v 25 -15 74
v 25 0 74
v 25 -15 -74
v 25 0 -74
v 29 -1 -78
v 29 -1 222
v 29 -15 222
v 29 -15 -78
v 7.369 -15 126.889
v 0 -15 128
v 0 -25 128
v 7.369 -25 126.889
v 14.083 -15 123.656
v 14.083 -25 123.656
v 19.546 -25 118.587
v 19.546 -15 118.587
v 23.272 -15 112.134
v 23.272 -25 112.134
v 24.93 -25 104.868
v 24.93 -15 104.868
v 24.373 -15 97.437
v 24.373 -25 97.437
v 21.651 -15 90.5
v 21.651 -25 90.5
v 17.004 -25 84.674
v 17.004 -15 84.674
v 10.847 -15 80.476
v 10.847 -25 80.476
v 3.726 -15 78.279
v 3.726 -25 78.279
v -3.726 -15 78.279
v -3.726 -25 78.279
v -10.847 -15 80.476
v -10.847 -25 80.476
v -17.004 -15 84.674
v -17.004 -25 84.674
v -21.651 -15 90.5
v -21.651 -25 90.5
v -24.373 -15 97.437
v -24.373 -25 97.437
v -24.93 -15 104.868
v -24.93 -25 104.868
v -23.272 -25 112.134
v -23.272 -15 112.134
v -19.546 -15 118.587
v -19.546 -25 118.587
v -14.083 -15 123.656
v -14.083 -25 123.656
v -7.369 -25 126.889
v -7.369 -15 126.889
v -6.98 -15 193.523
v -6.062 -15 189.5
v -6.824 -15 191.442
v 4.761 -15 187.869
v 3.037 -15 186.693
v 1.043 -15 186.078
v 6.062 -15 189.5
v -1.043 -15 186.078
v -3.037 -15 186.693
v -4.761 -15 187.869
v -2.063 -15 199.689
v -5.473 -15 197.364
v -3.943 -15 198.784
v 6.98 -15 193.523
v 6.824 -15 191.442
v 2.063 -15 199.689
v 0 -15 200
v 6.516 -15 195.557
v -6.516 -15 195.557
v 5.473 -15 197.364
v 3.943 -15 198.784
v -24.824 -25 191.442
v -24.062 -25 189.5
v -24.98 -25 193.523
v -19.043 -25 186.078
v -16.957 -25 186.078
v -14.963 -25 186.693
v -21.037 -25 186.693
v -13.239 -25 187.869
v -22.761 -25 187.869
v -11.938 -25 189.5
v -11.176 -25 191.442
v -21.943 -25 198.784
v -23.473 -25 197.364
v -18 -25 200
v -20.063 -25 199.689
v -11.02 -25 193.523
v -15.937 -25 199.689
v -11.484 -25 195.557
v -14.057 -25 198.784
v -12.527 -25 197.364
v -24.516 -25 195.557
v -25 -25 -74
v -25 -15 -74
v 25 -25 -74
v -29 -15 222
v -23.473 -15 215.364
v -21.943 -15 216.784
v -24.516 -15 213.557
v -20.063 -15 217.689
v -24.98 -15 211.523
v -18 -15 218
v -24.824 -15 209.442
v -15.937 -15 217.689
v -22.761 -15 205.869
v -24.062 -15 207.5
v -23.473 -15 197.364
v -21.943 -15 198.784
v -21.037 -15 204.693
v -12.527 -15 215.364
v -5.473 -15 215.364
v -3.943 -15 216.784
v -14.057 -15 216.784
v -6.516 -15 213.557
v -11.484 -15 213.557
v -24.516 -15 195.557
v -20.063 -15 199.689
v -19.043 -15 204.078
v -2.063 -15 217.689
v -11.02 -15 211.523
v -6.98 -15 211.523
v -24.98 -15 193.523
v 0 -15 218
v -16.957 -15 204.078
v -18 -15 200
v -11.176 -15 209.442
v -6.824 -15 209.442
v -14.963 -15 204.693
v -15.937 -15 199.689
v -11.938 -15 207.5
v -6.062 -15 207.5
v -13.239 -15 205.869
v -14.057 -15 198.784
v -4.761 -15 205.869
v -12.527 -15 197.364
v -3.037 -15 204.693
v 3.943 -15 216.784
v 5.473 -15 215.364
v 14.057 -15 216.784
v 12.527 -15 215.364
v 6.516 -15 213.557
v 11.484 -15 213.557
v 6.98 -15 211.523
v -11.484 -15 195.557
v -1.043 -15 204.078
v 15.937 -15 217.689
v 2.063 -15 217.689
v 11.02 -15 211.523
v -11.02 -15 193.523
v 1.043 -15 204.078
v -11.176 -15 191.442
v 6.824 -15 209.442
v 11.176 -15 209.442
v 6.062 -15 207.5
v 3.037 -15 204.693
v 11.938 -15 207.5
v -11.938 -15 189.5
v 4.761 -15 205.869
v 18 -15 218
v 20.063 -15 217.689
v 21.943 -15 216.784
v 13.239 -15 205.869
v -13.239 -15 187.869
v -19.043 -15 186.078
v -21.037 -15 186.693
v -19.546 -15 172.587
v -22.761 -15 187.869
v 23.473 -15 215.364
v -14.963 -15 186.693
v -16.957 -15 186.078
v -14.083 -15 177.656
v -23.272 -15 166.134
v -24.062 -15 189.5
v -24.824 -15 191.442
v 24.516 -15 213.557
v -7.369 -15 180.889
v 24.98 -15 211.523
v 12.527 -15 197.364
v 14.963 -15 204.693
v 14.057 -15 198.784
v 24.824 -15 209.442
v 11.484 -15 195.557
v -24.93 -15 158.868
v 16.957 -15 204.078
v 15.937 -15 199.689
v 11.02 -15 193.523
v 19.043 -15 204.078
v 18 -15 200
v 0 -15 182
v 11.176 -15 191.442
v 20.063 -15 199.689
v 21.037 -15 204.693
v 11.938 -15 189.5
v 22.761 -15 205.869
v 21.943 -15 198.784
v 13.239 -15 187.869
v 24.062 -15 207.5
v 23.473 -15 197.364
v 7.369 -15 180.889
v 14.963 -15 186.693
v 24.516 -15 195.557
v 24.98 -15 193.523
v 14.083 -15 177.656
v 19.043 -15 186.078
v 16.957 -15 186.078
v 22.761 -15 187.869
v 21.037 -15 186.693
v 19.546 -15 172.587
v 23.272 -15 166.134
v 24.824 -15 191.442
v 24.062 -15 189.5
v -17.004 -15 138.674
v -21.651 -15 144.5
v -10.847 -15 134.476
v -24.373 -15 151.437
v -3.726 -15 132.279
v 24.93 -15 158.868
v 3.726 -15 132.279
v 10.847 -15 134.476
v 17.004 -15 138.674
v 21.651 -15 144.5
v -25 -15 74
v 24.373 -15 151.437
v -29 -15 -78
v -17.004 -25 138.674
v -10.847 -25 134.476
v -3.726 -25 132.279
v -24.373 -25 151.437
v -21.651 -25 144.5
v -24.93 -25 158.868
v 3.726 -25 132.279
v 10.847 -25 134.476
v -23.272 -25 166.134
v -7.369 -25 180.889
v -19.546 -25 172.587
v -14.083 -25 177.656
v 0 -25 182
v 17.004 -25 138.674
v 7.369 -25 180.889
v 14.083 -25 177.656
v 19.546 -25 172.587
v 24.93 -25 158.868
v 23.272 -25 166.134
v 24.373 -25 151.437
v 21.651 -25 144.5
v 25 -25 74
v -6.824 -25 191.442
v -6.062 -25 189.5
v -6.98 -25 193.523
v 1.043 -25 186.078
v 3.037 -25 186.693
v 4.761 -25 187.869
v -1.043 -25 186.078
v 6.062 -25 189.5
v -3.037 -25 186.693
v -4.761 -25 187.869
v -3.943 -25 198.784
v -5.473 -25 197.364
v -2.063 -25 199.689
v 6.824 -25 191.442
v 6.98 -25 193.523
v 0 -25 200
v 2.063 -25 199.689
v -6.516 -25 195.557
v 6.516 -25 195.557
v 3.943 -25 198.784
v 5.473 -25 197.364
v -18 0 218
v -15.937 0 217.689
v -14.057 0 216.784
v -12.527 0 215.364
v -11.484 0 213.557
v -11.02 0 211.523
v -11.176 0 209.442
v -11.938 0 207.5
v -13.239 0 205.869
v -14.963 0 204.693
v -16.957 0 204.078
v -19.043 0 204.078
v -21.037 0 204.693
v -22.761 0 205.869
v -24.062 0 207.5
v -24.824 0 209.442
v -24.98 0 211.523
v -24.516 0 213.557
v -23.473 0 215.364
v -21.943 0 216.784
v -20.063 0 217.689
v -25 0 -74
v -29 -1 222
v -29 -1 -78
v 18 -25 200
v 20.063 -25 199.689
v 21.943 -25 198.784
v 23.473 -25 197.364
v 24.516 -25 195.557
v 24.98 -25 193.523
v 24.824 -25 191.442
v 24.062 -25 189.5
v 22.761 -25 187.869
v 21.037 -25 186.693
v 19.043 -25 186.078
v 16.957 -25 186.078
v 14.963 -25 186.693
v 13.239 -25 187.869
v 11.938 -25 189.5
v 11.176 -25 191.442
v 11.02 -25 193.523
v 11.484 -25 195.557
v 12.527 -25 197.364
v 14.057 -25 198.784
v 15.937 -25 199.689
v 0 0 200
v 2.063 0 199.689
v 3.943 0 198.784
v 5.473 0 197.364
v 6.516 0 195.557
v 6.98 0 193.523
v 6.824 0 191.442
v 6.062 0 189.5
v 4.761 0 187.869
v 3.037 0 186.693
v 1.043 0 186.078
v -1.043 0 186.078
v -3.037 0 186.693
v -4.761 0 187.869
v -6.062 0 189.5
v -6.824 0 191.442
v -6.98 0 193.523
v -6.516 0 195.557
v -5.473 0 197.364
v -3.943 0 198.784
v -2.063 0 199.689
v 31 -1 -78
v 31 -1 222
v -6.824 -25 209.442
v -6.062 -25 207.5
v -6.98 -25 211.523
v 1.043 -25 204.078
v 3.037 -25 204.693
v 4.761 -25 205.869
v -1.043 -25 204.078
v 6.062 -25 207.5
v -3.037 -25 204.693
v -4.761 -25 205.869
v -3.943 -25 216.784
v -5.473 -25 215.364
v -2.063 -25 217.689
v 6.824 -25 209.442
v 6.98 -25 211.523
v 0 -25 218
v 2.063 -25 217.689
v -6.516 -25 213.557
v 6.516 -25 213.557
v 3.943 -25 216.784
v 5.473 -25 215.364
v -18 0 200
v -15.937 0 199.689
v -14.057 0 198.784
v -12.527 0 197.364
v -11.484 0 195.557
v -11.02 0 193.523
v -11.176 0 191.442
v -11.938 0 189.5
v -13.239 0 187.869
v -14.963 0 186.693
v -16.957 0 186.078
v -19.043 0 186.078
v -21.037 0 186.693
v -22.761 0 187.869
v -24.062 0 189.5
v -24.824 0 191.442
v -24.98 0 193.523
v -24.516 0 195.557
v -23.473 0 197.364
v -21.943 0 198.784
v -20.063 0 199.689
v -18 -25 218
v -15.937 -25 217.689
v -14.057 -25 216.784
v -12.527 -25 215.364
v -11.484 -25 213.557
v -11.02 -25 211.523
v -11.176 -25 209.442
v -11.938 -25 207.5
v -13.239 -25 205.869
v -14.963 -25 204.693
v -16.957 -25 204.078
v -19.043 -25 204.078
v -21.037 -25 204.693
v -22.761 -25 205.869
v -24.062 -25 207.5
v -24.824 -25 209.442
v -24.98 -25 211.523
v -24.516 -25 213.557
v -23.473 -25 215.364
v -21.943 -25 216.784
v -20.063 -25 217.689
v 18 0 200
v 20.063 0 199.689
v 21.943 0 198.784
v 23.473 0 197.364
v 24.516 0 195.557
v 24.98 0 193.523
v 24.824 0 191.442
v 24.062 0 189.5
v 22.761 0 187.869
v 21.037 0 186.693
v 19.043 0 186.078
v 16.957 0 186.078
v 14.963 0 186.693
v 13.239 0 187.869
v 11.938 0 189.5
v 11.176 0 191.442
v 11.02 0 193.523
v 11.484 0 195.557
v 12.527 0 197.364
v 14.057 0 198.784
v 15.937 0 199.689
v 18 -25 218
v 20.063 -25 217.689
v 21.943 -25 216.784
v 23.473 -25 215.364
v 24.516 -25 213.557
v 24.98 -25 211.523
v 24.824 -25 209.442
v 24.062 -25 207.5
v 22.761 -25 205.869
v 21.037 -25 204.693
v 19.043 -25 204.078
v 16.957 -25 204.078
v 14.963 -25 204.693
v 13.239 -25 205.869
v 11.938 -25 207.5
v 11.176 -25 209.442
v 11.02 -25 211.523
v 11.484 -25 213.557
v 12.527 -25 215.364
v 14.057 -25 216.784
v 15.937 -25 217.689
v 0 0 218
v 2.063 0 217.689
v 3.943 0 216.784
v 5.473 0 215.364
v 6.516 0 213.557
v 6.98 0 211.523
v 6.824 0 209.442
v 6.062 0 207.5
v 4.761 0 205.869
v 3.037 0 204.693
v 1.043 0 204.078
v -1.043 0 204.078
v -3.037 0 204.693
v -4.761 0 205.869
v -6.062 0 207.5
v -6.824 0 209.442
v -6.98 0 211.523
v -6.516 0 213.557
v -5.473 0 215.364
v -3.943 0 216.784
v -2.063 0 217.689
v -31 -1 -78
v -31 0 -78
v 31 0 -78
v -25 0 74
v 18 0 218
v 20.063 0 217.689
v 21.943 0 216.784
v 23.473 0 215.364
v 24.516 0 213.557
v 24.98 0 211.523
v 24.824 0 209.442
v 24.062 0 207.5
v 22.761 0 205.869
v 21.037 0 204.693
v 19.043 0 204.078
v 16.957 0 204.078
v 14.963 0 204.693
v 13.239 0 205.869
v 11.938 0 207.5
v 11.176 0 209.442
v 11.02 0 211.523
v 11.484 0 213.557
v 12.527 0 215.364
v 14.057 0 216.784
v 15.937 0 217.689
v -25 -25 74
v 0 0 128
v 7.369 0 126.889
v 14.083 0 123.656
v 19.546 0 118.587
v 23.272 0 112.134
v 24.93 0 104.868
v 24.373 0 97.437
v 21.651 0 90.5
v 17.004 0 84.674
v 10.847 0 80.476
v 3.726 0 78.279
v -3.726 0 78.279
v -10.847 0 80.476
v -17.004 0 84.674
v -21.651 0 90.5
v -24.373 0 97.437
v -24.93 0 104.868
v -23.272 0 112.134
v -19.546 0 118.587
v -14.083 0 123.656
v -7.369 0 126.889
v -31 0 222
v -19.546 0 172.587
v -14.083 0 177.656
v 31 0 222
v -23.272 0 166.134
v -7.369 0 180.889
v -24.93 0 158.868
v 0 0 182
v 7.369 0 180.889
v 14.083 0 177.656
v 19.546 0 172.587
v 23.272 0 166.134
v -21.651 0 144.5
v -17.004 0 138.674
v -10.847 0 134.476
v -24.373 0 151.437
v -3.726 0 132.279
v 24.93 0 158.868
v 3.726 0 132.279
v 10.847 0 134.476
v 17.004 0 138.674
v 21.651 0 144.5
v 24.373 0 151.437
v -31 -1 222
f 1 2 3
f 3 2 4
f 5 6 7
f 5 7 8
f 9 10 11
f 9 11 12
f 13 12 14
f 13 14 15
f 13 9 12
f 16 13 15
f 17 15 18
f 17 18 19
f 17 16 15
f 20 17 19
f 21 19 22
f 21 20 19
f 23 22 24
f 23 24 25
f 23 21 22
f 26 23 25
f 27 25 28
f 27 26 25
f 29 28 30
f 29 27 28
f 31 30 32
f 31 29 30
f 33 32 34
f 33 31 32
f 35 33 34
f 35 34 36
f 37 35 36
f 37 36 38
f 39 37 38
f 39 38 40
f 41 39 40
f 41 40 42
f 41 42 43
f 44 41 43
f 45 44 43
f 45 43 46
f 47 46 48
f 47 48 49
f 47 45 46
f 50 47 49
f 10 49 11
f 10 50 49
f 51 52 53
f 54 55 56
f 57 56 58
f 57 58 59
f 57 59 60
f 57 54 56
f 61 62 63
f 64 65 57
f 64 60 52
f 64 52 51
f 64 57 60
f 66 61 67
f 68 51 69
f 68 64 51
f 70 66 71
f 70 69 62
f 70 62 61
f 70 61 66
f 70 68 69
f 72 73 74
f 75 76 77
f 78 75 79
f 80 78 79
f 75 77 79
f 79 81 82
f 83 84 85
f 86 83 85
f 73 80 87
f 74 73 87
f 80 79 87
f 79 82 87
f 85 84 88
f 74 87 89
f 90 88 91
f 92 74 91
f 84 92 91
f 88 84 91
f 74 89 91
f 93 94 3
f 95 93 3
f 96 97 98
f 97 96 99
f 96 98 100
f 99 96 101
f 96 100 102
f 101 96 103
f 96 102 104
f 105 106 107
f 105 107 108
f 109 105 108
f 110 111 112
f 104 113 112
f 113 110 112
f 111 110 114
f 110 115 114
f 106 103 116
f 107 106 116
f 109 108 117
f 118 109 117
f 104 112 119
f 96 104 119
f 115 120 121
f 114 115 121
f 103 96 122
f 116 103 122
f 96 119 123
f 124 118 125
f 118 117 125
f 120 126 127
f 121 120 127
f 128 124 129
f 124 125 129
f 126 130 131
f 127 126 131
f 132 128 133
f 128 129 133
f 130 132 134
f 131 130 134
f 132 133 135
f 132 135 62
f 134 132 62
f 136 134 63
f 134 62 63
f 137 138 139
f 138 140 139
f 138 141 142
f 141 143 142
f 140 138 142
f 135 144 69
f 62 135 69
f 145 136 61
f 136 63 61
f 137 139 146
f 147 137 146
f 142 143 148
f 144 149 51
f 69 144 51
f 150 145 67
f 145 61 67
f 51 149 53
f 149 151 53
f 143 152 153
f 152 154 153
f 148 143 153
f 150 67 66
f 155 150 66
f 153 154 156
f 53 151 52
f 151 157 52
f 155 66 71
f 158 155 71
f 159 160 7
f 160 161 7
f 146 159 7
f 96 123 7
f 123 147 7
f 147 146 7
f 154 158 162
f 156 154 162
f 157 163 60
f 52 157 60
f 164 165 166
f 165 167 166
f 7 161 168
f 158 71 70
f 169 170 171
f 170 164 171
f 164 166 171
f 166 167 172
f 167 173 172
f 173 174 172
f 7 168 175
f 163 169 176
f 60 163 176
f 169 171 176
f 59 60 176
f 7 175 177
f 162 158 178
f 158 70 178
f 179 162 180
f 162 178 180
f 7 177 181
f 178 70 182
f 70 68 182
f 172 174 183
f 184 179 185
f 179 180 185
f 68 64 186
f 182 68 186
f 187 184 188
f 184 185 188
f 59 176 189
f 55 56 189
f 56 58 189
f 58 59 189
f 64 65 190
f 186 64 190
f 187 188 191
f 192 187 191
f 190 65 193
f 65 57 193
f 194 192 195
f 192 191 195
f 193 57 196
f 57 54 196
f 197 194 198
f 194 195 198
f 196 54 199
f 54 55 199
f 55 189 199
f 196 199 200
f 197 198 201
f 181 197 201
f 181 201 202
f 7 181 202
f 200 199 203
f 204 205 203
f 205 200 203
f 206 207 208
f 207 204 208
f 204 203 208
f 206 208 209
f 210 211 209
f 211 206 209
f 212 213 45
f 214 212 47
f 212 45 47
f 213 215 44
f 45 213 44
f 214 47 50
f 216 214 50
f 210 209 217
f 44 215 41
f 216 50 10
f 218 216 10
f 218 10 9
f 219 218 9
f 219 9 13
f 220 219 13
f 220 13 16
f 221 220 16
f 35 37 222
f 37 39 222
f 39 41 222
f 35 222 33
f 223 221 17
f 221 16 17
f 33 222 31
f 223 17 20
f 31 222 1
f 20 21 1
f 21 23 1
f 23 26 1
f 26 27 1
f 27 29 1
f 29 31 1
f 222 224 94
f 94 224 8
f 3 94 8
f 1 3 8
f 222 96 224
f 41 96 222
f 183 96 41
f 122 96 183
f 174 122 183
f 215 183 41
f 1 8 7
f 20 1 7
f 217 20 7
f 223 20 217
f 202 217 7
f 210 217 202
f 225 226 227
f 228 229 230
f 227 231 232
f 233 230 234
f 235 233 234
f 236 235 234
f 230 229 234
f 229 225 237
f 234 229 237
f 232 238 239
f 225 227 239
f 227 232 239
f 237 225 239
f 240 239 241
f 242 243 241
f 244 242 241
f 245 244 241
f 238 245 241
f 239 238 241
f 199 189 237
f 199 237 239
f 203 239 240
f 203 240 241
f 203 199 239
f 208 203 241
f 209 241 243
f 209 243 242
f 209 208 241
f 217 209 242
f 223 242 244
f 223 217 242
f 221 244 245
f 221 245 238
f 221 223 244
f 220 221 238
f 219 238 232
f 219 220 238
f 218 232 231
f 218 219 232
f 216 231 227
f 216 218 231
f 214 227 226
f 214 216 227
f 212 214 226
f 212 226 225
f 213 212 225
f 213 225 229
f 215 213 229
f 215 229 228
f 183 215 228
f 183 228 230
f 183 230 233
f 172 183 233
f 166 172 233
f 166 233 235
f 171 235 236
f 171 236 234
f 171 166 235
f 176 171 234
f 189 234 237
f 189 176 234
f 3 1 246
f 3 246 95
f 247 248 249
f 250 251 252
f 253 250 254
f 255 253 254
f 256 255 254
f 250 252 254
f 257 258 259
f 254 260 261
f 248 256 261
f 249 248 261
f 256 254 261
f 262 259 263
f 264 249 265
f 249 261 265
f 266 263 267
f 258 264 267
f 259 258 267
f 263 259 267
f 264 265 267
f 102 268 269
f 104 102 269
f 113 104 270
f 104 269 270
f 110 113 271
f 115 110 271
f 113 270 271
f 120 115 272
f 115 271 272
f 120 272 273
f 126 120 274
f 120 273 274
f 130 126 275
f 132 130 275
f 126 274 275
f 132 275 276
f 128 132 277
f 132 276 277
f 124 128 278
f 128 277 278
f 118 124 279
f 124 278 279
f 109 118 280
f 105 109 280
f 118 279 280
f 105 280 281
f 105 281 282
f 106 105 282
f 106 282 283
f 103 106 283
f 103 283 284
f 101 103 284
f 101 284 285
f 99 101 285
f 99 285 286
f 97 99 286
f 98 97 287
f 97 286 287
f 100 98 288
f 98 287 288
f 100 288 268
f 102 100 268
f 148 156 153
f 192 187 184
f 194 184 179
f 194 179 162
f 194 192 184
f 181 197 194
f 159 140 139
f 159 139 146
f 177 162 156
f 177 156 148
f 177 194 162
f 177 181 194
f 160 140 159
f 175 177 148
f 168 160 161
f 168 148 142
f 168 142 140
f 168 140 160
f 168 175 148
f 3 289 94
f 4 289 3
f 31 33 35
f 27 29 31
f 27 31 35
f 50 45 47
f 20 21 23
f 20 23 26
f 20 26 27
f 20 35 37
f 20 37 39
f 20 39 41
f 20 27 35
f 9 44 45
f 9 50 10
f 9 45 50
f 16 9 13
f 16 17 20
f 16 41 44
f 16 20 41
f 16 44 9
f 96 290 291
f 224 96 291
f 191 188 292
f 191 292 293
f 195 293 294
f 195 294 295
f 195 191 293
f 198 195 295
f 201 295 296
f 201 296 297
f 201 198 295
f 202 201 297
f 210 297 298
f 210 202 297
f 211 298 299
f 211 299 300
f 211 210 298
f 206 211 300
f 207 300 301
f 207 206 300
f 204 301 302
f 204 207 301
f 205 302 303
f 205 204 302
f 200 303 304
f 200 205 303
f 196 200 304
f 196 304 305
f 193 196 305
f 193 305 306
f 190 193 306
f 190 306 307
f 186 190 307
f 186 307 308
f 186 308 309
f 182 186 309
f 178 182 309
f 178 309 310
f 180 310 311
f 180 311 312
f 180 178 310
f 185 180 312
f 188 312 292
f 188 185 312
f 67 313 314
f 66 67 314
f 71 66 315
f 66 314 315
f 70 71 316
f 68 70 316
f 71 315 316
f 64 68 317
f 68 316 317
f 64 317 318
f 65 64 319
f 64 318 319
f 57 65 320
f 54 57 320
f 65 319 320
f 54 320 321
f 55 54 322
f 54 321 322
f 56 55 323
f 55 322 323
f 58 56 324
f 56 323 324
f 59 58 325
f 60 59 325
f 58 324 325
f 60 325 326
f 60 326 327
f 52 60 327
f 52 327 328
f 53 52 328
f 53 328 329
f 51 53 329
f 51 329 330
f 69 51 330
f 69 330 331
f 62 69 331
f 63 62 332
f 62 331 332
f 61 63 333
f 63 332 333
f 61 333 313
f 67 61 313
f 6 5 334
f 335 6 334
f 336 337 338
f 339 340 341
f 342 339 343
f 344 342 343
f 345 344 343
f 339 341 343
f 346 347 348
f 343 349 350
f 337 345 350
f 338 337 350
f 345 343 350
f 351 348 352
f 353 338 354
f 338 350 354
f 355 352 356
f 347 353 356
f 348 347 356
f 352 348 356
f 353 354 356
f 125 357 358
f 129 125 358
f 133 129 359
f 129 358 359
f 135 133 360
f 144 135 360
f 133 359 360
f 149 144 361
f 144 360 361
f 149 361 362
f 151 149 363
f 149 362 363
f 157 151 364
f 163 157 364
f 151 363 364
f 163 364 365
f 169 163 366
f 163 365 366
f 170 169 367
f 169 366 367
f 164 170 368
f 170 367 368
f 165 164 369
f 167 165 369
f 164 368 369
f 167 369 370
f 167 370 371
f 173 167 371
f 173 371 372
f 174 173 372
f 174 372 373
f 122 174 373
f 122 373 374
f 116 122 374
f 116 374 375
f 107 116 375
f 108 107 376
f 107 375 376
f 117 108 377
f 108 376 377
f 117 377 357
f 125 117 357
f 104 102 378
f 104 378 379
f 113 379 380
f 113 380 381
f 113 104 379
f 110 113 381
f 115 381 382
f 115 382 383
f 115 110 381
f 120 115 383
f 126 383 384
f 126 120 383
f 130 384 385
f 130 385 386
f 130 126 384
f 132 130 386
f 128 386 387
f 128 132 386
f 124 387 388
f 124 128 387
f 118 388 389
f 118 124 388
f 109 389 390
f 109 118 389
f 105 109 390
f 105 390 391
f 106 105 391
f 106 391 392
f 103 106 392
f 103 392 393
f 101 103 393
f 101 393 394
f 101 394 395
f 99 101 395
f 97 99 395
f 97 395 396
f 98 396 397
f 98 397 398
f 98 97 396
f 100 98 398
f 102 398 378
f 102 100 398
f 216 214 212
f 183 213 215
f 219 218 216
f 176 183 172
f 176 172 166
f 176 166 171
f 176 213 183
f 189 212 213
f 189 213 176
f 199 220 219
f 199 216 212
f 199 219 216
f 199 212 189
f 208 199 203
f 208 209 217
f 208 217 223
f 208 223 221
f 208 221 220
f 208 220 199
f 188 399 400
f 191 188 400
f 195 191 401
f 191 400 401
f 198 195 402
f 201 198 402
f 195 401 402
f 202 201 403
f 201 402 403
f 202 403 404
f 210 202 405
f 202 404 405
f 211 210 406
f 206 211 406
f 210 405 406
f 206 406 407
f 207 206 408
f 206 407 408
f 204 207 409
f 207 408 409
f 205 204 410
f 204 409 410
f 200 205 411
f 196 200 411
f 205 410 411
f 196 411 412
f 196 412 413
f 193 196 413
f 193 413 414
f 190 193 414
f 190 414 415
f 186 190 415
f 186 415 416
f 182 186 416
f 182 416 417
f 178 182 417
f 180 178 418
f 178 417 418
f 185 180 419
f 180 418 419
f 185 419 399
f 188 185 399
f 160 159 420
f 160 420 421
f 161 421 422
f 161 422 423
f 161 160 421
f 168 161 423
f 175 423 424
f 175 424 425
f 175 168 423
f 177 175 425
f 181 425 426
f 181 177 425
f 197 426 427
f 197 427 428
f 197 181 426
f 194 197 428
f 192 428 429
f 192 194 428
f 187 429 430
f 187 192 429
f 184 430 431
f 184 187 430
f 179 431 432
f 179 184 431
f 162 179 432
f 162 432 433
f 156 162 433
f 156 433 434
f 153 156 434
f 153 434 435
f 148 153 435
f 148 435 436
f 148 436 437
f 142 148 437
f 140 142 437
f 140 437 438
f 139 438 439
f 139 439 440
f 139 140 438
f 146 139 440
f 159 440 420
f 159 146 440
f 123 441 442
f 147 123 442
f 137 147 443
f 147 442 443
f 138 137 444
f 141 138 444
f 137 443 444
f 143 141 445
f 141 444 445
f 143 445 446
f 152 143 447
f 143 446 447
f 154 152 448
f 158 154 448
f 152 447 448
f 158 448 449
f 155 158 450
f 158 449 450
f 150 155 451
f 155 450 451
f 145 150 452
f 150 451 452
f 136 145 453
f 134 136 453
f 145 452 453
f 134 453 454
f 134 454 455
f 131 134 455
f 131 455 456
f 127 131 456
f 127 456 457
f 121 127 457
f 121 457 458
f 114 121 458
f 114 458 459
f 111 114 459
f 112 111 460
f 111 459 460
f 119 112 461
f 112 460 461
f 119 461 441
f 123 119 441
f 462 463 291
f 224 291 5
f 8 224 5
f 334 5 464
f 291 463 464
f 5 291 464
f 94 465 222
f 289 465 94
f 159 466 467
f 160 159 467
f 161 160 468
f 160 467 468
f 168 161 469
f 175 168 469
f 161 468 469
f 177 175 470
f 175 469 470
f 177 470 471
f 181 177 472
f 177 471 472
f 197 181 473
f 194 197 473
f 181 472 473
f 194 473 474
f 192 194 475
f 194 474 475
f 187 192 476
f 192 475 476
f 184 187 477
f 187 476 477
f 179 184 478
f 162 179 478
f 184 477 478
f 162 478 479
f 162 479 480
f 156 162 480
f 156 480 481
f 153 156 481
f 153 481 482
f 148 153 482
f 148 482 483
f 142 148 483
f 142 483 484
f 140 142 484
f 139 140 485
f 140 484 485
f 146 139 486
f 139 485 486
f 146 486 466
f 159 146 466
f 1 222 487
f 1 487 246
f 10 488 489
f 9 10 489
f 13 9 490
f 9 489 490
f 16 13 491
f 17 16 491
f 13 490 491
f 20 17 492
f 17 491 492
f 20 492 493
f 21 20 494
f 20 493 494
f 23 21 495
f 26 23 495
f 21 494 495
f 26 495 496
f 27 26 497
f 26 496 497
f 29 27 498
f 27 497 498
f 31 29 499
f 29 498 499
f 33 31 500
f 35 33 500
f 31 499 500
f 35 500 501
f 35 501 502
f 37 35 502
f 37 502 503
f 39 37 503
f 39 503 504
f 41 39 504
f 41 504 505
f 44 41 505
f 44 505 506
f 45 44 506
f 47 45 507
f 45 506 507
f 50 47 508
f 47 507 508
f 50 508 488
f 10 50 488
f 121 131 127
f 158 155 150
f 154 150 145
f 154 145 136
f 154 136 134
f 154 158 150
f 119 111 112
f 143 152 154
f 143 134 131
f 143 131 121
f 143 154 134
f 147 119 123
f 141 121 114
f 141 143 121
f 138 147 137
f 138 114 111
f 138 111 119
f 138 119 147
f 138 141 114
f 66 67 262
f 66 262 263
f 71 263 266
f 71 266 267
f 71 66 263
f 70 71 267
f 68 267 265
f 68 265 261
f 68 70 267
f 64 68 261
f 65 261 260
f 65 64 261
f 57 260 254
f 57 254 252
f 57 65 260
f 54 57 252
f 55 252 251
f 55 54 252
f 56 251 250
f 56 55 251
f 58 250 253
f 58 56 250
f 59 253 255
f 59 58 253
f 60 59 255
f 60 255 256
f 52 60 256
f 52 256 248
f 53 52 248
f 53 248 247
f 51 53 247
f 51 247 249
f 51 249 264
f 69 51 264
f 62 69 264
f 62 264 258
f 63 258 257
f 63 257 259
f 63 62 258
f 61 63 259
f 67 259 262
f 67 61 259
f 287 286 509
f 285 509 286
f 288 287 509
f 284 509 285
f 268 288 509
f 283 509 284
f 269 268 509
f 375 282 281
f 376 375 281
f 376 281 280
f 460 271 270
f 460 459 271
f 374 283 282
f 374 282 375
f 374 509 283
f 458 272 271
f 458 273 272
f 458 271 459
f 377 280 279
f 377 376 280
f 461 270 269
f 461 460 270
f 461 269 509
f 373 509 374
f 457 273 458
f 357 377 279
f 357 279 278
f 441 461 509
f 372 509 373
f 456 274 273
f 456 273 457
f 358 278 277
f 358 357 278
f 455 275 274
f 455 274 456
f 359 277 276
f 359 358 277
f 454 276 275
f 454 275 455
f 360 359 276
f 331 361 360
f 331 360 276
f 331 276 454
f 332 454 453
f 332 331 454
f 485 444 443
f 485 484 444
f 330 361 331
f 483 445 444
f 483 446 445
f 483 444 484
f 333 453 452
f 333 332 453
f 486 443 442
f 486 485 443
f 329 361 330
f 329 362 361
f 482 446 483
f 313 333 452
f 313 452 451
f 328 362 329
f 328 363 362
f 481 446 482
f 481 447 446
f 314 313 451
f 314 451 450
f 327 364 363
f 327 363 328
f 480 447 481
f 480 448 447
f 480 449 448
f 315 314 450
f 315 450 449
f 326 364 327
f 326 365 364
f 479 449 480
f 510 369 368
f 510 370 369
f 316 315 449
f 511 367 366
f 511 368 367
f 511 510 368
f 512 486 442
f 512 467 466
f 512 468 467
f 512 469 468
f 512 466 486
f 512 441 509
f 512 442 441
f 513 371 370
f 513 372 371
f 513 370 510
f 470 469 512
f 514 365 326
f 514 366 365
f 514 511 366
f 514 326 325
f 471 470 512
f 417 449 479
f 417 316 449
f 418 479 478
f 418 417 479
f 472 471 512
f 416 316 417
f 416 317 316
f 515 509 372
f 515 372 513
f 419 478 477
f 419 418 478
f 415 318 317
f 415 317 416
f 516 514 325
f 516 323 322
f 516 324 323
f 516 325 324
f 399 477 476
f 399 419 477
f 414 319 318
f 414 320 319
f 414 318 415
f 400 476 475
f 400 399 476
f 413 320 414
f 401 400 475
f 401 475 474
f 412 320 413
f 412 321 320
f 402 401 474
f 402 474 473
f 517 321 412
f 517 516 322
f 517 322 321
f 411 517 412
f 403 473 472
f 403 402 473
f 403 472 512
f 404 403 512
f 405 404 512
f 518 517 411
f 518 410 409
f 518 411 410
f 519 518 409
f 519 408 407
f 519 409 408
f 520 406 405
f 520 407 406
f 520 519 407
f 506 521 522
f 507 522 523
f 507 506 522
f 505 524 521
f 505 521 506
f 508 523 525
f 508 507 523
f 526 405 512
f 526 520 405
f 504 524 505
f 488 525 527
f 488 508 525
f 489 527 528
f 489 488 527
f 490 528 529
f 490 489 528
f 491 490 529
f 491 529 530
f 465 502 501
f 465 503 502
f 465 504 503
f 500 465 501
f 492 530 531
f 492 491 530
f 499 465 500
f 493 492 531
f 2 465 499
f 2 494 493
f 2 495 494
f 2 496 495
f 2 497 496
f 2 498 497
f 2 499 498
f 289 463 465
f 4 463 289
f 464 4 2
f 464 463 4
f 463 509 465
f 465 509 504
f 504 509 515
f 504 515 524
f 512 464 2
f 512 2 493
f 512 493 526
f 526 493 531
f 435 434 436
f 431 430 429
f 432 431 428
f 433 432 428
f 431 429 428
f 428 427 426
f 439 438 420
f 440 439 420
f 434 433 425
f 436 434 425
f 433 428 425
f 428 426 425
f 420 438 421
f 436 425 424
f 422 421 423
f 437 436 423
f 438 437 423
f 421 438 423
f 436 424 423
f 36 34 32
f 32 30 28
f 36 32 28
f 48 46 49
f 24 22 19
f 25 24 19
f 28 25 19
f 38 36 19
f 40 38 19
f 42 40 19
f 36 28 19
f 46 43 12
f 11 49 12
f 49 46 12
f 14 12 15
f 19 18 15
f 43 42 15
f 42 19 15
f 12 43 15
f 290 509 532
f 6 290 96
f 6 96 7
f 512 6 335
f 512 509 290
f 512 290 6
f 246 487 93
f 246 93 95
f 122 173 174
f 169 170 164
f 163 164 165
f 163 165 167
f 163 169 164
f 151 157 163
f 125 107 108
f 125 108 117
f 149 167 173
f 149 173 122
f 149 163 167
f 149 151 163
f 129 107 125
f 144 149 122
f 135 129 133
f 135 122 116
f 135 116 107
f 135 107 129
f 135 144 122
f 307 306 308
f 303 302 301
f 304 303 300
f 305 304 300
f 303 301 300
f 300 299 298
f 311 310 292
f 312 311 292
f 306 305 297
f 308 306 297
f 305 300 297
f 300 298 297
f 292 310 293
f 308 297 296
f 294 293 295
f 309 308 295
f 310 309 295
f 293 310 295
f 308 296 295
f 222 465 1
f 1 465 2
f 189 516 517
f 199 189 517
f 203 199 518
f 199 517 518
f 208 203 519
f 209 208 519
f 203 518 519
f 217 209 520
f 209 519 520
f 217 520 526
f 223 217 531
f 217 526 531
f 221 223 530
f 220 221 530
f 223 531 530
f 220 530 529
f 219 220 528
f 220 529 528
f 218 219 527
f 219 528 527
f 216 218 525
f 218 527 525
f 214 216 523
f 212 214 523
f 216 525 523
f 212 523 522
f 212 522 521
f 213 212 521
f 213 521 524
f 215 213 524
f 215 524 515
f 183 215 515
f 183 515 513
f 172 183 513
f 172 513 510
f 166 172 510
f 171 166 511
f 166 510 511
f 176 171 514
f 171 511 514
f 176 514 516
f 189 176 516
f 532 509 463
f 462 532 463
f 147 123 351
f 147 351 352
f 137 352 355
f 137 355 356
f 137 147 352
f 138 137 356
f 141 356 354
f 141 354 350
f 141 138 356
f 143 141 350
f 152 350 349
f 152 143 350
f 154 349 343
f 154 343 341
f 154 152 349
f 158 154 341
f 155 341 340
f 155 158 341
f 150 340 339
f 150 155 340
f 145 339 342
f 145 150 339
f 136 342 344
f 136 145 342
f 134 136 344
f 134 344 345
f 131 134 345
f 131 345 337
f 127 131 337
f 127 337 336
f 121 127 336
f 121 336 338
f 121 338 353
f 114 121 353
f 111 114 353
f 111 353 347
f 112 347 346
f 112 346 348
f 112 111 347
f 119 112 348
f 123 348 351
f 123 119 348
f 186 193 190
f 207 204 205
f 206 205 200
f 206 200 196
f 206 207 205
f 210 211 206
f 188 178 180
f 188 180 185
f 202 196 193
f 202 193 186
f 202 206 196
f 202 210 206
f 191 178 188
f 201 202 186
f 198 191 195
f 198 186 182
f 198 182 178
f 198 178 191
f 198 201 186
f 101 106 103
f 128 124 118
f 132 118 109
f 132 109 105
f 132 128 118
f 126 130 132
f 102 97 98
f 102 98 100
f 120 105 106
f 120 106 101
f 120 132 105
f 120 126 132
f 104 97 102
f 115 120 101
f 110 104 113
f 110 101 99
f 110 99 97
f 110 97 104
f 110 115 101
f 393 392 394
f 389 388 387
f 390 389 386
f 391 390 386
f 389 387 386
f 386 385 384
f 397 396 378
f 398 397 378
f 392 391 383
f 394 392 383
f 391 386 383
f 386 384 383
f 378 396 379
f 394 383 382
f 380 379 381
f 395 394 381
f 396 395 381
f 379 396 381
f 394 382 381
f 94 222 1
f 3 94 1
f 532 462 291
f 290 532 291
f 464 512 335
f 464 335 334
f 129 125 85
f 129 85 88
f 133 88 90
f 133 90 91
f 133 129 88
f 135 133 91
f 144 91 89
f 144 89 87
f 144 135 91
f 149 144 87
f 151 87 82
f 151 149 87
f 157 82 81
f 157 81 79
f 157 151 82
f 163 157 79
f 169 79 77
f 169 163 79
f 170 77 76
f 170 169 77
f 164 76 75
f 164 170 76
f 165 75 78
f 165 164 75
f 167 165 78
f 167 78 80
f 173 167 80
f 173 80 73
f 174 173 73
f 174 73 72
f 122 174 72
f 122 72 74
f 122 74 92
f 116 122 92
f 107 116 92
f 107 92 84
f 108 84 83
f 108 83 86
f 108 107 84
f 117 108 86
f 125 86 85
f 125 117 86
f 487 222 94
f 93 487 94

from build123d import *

# Parameters (mm, degrees)
SKETCH1_W             = 58
SKETCH1_H             = 300
SKETCH1_R             = 7
SKETCH1_R_2           = 25
SKETCH1_W_2           = 50
SKETCH1_H_2           = 148
BOSS_EXTRUDE1_DEPTH   = 15
BOSS_EXTRUDE2_START   = -15
SKETCH3_W             = 50
SKETCH3_H             = 148
BOSS_EXTRUDE2_DEPTH   = 10
SKETCH3_R             = 25
BOSS_EXTRUDE2_2_DEPTH = 10
BOSS_EXTRUDE2_3_DEPTH = 10
SKETCH3_R_2           = 7
BOSS_EXTRUDE2_4_DEPTH = 10
BOSS_EXTRUDE2_5_DEPTH = 10
BOSS_EXTRUDE2_6_DEPTH = 10
BOSS_EXTRUDE2_7_DEPTH = 10
BOSS_EXTRUDE2_8_DEPTH = 10
BOSS_EXTRUDE2_9_DEPTH = 10
SKETCH6_W             = 2
SKETCH6_H             = 300
BOSS_EXTRUDE4_DEPTH   = 1


with BuildPart() as part:
    # Sketch1 → Boss-Extrude1 (new body)
    with BuildSketch(Plane(origin=(0, 0, 0), x_dir=(1, 0, 0), z_dir=(0, 1, 0))):
        with Locations((0, -72)):
            Rectangle(SKETCH1_W, SKETCH1_H)
        with Locations(Location((-18, -193, 0), (0, 0, 270))):
            Circle(SKETCH1_R, mode=Mode.SUBTRACT)
        with Locations(Location((0, -193, 0), (0, 0, 270))):
            Circle(SKETCH1_R, mode=Mode.SUBTRACT)
        with Locations(Location((18, -193, 0), (0, 0, 270))):
            Circle(SKETCH1_R, mode=Mode.SUBTRACT)
        with Locations(Location((-18, -211, 0), (0, 0, 270))):
            Circle(SKETCH1_R, mode=Mode.SUBTRACT)
        with Locations(Location((0, -211, 0), (0, 0, 270))):
            Circle(SKETCH1_R, mode=Mode.SUBTRACT)
        with Locations(Location((18, -211, 0), (0, 0, 270))):
            Circle(SKETCH1_R, mode=Mode.SUBTRACT)
        with Locations(Location((0, -157, 0), (0, 0, 270))):
            Circle(SKETCH1_R_2, mode=Mode.SUBTRACT)
        with Locations(Location((0, -103, 0), (0, 0, 270))):
            Circle(SKETCH1_R_2, mode=Mode.SUBTRACT)
        Rectangle(SKETCH1_W_2, SKETCH1_H_2, mode=Mode.SUBTRACT)
    extrude(amount=-BOSS_EXTRUDE1_DEPTH)

    # Sketch6 → Boss-Extrude4 (add)
    with BuildSketch(Plane(origin=(0, 0, 0), x_dir=(1, 0, 0), z_dir=(0, 1, 0))):
        with Locations((-30, -72)):
            Rectangle(SKETCH6_W, SKETCH6_H)
        with Locations((30, -72)):
            Rectangle(SKETCH6_W, SKETCH6_H)
    extrude(amount=-BOSS_EXTRUDE4_DEPTH)


with BuildPart() as body_2:
    # Sketch3 → Boss-Extrude2 (new body)
    with BuildSketch(Plane(origin=(0, 0, 0), x_dir=(1, 0, 0), z_dir=(0, 1, 0)).offset(BOSS_EXTRUDE2_START)):
        Rectangle(SKETCH3_W, SKETCH3_H)
    extrude(amount=-BOSS_EXTRUDE2_DEPTH)


with BuildPart() as body_3:
    # Sketch3 → Boss-Extrude2 2 (new body)
    with BuildSketch(Plane(origin=(0, 0, 0), x_dir=(1, 0, 0), z_dir=(0, 1, 0)).offset(BOSS_EXTRUDE2_START)):
        with Locations(Location((0, -103, 0), (0, 0, 270))):
            Circle(SKETCH3_R)
    extrude(amount=-BOSS_EXTRUDE2_2_DEPTH)


with BuildPart() as body_4:
    # Sketch3 → Boss-Extrude2 3 (new body)
    with BuildSketch(Plane(origin=(0, 0, 0), x_dir=(1, 0, 0), z_dir=(0, 1, 0)).offset(BOSS_EXTRUDE2_START)):
        with Locations(Location((0, -157, 0), (0, 0, 270))):
            Circle(SKETCH3_R)
    extrude(amount=-BOSS_EXTRUDE2_3_DEPTH)


with BuildPart() as body_5:
    # Sketch3 → Boss-Extrude2 4 (new body)
    with BuildSketch(Plane(origin=(0, 0, 0), x_dir=(1, 0, 0), z_dir=(0, 1, 0)).offset(BOSS_EXTRUDE2_START)):
        with Locations(Location((-18, -193, 0), (0, 0, 270))):
            Circle(SKETCH3_R_2)
    extrude(amount=-BOSS_EXTRUDE2_4_DEPTH)


with BuildPart() as body_6:
    # Sketch3 → Boss-Extrude2 5 (new body)
    with BuildSketch(Plane(origin=(0, 0, 0), x_dir=(1, 0, 0), z_dir=(0, 1, 0)).offset(BOSS_EXTRUDE2_START)):
        with Locations(Location((0, -193, 0), (0, 0, 270))):
            Circle(SKETCH3_R_2)
    extrude(amount=-BOSS_EXTRUDE2_5_DEPTH)


with BuildPart() as body_7:
    # Sketch3 → Boss-Extrude2 6 (new body)
    with BuildSketch(Plane(origin=(0, 0, 0), x_dir=(1, 0, 0), z_dir=(0, 1, 0)).offset(BOSS_EXTRUDE2_START)):
        with Locations(Location((18, -193, 0), (0, 0, 270))):
            Circle(SKETCH3_R_2)
    extrude(amount=-BOSS_EXTRUDE2_6_DEPTH)


with BuildPart() as body_8:
    # Sketch3 → Boss-Extrude2 7 (new body)
    with BuildSketch(Plane(origin=(0, 0, 0), x_dir=(1, 0, 0), z_dir=(0, 1, 0)).offset(BOSS_EXTRUDE2_START)):
        with Locations(Location((18, -211, 0), (0, 0, 270))):
            Circle(SKETCH3_R_2)
    extrude(amount=-BOSS_EXTRUDE2_7_DEPTH)


with BuildPart() as body_9:
    # Sketch3 → Boss-Extrude2 8 (new body)
    with BuildSketch(Plane(origin=(0, 0, 0), x_dir=(1, 0, 0), z_dir=(0, 1, 0)).offset(BOSS_EXTRUDE2_START)):
        with Locations(Location((0, -211, 0), (0, 0, 270))):
            Circle(SKETCH3_R_2)
    extrude(amount=-BOSS_EXTRUDE2_8_DEPTH)


with BuildPart() as body_10:
    # Sketch3 → Boss-Extrude2 9 (new body)
    with BuildSketch(Plane(origin=(0, 0, 0), x_dir=(1, 0, 0), z_dir=(0, 1, 0)).offset(BOSS_EXTRUDE2_START)):
        with Locations(Location((-18, -211, 0), (0, 0, 270))):
            Circle(SKETCH3_R_2)
    extrude(amount=-BOSS_EXTRUDE2_9_DEPTH)


solid = Compound([part.part, body_2.part, body_3.part, body_4.part, body_5.part, body_6.part, body_7.part, body_8.part, body_9.part, body_10.part])
